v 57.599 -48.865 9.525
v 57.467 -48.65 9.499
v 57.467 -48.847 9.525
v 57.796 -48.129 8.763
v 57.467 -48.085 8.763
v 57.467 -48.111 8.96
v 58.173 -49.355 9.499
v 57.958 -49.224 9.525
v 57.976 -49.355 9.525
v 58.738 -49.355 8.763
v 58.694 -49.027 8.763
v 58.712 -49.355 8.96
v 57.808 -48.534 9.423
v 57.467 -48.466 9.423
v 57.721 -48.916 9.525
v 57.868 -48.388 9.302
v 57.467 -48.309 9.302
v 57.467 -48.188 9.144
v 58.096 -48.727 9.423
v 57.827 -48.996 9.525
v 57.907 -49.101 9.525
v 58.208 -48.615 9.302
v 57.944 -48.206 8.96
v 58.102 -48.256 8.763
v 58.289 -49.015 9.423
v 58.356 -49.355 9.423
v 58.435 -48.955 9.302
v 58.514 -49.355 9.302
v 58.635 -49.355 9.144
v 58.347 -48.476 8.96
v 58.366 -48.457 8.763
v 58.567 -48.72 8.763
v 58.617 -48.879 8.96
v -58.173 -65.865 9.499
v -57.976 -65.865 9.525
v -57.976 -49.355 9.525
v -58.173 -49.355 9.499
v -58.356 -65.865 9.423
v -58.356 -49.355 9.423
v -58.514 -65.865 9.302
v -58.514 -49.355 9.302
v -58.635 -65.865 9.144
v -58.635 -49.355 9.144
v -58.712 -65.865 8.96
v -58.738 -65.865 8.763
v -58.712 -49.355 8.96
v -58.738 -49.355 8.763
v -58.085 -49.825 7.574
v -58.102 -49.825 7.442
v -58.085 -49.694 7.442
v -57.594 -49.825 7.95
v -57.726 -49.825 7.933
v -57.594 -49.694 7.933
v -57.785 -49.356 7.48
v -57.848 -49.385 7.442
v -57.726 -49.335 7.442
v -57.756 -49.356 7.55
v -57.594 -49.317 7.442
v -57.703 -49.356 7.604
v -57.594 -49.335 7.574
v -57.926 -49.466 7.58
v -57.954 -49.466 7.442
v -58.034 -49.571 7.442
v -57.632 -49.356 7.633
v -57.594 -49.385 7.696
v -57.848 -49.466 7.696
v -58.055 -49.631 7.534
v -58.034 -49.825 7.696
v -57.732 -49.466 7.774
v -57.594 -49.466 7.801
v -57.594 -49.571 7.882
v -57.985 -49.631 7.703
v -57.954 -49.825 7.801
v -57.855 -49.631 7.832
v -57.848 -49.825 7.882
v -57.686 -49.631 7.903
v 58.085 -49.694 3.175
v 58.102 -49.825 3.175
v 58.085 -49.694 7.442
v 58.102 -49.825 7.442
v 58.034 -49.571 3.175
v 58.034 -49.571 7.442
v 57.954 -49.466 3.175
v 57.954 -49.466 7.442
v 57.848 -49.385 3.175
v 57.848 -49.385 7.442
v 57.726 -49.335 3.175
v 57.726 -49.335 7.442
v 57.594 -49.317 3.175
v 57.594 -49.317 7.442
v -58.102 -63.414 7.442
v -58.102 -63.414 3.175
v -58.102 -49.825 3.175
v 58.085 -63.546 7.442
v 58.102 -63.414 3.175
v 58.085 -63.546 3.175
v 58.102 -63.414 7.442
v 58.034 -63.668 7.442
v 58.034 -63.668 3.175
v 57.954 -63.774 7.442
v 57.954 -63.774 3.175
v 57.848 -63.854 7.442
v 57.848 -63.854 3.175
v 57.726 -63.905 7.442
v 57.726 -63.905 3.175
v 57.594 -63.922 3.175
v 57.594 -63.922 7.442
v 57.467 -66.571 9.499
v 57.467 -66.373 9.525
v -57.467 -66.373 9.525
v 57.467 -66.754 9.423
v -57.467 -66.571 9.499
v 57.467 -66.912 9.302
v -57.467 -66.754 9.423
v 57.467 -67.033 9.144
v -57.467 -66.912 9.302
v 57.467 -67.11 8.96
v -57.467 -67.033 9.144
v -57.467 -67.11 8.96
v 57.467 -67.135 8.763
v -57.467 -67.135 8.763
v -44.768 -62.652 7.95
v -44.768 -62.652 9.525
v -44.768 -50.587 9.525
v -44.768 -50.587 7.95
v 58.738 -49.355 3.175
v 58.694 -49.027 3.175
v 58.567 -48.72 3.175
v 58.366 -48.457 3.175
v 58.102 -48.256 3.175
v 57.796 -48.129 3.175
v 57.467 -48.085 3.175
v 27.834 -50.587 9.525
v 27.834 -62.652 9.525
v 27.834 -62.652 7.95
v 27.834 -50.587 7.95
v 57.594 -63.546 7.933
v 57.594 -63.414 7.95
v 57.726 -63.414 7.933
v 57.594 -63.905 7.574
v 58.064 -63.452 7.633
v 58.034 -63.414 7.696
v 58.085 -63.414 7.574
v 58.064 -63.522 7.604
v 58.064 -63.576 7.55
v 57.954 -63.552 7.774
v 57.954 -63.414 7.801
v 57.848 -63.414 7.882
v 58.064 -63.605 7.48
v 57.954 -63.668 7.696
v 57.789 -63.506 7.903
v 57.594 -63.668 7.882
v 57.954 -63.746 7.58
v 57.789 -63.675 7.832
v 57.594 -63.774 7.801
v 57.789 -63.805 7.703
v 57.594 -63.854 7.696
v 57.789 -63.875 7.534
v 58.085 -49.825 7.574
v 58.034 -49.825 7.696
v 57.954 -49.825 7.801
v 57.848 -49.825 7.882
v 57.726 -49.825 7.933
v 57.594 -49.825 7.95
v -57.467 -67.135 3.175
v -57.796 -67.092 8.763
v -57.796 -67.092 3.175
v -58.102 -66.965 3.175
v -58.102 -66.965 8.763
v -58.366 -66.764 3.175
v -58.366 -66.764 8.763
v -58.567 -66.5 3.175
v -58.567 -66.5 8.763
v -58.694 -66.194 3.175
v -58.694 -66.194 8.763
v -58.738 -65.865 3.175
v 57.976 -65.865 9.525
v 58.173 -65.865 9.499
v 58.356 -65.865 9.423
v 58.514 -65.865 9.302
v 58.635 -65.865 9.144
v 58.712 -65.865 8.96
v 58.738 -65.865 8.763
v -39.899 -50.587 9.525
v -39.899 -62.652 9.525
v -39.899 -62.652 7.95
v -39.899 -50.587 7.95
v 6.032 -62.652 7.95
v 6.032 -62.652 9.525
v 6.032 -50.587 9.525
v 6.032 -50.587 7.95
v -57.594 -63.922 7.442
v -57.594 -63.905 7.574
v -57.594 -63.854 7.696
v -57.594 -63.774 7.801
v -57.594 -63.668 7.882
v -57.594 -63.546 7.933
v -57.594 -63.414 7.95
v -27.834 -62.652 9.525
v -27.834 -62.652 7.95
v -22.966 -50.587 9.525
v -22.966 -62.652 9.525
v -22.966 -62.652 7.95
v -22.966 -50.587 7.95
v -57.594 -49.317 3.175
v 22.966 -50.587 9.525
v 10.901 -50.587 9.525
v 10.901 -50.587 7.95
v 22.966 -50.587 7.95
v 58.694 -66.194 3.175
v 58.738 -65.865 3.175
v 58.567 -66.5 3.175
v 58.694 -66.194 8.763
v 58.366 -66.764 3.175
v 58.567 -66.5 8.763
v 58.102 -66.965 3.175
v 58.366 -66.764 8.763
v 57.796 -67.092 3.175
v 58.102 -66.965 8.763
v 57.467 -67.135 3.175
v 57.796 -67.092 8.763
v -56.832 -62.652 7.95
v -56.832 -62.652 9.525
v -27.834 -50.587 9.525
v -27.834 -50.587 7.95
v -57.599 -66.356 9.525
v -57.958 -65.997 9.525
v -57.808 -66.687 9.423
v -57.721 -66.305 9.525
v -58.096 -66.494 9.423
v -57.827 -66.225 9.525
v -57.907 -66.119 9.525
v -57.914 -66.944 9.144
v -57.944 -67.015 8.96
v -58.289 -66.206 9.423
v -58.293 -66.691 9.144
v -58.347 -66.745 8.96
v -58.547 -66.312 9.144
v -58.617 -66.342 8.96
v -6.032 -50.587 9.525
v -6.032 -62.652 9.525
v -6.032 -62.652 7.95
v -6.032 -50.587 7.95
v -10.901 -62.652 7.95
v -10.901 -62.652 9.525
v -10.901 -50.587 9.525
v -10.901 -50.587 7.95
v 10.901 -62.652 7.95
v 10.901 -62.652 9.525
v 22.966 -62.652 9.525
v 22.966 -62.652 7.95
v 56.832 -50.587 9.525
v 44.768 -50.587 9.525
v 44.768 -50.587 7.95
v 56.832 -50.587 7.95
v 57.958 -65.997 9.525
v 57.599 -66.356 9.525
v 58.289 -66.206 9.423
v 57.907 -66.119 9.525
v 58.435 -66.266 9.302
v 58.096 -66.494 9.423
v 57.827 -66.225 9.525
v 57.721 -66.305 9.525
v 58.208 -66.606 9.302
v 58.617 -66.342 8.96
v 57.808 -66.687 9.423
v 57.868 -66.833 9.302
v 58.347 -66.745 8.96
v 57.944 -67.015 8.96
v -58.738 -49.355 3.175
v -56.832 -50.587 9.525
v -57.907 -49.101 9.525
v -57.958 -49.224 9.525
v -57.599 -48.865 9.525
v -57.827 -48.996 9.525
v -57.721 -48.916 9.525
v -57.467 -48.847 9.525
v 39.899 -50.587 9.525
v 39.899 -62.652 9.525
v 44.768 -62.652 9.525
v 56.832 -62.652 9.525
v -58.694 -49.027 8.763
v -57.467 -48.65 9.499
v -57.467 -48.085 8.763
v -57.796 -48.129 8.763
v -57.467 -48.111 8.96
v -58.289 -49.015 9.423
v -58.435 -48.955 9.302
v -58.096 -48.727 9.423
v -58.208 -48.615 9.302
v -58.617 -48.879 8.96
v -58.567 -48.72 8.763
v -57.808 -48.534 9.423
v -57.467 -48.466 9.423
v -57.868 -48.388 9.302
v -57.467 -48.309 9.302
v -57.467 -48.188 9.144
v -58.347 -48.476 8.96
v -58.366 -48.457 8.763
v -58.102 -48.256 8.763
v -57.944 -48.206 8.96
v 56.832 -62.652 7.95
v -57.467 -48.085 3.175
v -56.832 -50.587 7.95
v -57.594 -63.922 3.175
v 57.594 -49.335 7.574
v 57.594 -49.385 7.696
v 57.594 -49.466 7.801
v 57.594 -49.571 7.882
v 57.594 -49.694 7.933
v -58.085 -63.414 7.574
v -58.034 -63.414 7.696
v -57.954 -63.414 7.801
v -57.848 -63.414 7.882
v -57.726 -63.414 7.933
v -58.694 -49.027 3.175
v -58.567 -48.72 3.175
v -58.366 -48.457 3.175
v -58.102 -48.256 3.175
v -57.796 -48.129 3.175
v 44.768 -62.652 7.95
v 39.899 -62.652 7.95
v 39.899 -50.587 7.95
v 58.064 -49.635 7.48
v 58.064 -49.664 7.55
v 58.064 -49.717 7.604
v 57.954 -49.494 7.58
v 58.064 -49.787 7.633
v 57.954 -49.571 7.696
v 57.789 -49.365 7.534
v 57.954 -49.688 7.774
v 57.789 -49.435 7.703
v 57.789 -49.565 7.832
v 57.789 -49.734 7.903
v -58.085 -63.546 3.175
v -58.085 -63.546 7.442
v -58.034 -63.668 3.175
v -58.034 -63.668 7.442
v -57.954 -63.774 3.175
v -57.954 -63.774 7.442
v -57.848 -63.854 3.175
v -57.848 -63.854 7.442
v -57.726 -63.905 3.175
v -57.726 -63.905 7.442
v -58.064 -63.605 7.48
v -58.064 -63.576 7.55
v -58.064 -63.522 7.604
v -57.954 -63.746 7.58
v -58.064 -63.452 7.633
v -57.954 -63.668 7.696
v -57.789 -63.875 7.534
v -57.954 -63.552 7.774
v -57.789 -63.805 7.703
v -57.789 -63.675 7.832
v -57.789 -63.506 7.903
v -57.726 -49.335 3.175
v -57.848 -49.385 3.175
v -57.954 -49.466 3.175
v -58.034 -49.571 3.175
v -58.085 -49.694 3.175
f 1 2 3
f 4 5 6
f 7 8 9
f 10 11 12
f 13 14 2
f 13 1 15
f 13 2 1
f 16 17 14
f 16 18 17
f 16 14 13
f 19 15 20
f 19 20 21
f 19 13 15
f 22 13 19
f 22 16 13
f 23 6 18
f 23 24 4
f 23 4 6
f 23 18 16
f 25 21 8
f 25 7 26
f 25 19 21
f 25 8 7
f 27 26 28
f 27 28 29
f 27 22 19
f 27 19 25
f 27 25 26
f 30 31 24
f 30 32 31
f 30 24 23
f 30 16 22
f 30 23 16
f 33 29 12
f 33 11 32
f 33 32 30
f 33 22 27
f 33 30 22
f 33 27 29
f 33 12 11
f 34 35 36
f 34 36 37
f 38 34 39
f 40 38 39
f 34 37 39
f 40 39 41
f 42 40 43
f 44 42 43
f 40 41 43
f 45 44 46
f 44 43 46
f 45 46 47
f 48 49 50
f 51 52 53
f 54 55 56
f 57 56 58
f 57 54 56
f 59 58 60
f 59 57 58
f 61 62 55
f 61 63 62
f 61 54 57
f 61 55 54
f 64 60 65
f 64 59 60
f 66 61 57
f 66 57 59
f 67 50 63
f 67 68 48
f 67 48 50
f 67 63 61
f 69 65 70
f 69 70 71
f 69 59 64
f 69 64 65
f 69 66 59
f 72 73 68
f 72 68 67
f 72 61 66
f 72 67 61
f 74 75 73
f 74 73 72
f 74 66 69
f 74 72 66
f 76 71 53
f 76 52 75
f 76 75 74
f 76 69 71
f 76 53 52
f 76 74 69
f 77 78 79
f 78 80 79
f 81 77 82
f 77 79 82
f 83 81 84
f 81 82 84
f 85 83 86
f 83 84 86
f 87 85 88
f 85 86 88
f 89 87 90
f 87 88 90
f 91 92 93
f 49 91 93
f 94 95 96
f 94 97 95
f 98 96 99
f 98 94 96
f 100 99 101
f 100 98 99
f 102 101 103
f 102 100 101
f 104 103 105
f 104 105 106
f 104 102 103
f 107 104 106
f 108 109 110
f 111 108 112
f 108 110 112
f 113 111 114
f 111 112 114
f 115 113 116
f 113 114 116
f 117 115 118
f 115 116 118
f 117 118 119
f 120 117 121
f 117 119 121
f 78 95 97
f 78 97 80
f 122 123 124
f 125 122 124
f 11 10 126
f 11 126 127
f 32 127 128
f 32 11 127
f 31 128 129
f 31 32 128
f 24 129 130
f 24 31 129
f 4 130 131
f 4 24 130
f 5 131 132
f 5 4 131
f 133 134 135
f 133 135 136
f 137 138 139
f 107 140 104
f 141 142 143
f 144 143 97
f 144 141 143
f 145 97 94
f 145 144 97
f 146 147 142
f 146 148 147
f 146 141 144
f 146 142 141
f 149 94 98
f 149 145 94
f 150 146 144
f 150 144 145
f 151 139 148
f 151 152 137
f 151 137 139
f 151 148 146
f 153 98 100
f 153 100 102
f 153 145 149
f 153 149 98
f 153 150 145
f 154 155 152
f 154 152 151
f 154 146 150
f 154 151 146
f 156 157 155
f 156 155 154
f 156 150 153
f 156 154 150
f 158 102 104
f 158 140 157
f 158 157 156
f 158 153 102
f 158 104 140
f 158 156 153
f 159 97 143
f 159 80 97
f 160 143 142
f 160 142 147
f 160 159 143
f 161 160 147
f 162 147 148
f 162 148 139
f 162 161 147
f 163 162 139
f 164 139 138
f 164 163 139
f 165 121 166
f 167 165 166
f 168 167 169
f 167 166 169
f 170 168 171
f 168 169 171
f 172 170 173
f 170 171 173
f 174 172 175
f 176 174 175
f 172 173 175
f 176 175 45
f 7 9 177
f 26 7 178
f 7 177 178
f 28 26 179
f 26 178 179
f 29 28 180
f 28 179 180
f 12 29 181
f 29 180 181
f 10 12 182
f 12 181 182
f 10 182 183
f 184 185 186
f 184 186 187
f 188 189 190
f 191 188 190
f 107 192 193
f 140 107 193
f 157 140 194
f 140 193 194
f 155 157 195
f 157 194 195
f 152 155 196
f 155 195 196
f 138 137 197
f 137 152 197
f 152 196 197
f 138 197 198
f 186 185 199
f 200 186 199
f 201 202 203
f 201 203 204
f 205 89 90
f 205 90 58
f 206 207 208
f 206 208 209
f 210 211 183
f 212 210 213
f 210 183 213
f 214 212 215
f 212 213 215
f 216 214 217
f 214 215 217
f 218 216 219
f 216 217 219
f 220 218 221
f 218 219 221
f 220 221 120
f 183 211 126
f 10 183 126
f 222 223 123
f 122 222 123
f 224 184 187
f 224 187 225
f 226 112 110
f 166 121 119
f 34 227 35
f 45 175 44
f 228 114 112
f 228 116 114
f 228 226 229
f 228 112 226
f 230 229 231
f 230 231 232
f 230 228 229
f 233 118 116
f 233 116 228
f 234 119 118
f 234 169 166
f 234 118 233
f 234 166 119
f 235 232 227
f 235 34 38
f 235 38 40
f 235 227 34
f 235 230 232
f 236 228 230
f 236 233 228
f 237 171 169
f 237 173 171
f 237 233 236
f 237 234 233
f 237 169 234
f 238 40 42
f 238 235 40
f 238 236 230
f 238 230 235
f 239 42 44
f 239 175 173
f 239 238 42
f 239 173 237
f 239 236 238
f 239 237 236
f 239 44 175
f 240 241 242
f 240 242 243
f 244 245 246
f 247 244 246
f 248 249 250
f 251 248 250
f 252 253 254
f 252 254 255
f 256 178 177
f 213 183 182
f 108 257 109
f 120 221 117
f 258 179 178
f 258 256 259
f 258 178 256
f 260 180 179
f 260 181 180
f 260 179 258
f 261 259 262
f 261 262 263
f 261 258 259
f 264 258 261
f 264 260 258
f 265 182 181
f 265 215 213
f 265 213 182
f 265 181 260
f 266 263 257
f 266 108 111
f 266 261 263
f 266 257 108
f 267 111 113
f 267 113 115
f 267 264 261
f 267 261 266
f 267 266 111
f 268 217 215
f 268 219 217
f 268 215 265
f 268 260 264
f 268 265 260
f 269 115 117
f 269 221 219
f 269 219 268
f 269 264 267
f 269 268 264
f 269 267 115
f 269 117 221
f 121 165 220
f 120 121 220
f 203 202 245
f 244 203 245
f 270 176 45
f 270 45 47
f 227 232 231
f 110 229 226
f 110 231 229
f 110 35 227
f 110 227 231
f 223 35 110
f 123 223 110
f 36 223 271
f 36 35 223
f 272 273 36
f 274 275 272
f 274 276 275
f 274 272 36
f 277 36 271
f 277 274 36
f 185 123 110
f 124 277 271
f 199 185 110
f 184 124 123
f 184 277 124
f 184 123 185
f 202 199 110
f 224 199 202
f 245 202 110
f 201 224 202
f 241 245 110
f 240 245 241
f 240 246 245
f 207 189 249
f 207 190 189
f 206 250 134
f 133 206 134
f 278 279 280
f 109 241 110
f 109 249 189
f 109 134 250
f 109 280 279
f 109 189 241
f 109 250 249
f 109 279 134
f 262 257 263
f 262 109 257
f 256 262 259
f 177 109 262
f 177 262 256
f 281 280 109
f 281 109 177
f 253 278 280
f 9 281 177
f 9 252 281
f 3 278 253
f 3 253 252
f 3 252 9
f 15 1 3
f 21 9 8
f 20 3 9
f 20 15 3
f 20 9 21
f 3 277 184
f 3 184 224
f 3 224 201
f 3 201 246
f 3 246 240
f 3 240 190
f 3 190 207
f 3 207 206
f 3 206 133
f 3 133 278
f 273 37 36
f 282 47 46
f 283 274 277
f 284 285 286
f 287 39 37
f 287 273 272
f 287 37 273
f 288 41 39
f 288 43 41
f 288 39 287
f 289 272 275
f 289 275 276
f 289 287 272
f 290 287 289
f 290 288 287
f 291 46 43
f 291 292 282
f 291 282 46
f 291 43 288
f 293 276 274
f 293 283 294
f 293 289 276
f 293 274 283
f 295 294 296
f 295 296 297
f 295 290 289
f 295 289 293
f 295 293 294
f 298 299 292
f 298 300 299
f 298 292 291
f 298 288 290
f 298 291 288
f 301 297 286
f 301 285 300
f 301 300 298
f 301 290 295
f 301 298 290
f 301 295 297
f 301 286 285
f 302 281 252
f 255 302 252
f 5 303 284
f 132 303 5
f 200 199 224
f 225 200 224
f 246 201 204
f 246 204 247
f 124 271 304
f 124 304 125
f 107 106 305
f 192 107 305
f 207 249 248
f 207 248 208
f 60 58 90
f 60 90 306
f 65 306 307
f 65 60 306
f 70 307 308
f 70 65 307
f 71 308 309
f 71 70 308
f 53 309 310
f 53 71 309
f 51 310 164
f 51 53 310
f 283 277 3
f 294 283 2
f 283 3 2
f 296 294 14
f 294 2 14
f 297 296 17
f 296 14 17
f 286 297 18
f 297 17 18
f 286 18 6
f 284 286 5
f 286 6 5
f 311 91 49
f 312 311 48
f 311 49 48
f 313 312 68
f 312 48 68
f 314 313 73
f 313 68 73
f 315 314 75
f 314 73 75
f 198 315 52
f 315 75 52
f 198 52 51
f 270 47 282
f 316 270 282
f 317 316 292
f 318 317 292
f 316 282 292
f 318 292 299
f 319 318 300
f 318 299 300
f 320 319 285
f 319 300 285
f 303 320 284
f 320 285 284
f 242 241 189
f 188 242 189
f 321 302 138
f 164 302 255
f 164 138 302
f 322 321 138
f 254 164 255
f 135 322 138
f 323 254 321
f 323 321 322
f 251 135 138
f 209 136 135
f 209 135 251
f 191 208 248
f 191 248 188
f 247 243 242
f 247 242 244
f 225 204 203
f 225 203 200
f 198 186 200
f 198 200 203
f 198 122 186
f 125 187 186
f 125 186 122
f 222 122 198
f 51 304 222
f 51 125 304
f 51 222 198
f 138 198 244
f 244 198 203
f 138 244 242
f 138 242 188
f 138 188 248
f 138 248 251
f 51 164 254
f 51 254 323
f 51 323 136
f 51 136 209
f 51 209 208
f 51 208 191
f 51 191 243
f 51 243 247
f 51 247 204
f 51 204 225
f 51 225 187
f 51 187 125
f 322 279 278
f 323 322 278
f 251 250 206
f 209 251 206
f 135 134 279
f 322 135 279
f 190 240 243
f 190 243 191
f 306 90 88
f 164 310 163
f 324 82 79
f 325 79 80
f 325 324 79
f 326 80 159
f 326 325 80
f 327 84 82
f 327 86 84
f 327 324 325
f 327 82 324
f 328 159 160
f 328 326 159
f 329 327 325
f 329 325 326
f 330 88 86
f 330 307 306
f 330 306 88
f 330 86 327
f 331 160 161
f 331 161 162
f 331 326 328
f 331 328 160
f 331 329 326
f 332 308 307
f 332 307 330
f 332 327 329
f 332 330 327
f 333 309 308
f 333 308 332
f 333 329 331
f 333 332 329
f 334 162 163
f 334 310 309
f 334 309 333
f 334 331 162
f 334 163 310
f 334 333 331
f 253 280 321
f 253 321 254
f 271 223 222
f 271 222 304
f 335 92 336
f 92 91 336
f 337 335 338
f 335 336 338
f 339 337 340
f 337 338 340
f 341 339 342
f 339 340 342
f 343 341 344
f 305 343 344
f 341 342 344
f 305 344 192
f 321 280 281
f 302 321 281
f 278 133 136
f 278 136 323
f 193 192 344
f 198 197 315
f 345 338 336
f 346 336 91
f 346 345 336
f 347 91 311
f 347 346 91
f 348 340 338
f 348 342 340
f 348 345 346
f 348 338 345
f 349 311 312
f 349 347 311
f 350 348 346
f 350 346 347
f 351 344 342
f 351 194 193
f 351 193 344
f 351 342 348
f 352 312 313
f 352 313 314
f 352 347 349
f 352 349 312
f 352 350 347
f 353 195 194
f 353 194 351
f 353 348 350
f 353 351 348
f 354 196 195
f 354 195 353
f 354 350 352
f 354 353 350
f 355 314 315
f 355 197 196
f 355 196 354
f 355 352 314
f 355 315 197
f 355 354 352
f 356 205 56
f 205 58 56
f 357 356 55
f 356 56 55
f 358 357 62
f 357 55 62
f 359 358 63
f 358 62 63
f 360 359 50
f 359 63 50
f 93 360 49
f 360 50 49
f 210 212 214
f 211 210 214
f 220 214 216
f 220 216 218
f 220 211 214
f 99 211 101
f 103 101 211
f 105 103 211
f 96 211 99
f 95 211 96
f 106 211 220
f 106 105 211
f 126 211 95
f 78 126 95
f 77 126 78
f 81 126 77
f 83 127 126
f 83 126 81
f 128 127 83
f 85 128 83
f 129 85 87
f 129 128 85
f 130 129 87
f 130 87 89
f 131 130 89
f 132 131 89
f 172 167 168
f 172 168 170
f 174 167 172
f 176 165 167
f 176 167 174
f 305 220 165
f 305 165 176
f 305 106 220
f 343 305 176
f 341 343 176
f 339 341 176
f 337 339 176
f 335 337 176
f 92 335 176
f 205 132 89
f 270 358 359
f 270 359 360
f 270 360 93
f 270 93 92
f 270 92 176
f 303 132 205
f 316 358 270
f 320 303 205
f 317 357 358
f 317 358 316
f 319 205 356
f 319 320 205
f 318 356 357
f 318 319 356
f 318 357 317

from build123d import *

# Parameters (mm, degrees)
SKETCH1_W             = 117.475
SKETCH1_H             = 19.05
BOSS_EXTRUDE1_DEPTH   = 9.525
BOSS_EXTRUDE2_DEPTH   = 3.175
F_6_CLEARANCE_HOLE1_D = 4.3053
SKETCH5_W             = 12.065
SKETCH5_H             = 12.065
CUT_EXTRUDE1_DEPTH    = 10.525
SKETCH7_W             = 116.205
SKETCH7_H             = 14.605
CUT_EXTRUDE2_DEPTH    = 7.9502
SKETCH8_W             = 117.475
SKETCH8_H             = 28.575
CUT_EXTRUDE3_DEPTH    = 3.175
FILLET2_R             = 1.27
FILLET3_R             = 0.762
FILLET4_R             = 0.508


with BuildPart() as part:
    # Sketch1 → Boss-Extrude1 (new body)
    with BuildSketch(Plane.XY):
        with Locations((0, -57.6104797)):
            Rectangle(SKETCH1_W, SKETCH1_H)
    extrude(amount=BOSS_EXTRUDE1_DEPTH)

    # Sketch2 → Boss-Extrude2 (add)
    with BuildSketch(Plane.XY):
        with BuildLine():
            Line((35.56, -48.0854797), (58.7375, -48.0854797))
            Line((58.7375, -48.0854797), (44.939976119, -39.26086832))
            ThreePointArc((44.939976119, -39.26086832), (40.410479427, -39.106525106), (38.1, -43.0054797))
            Line((38.1, -43.0054797), (38.1, -45.5454797))
            ThreePointArc((38.1, -45.5454797), (37.356051224, -47.341530924), (35.56, -48.0854797))
        make_face()
        with BuildLine():
            Line((-38.1, -45.5454797), (-38.1, -43.0054797))
            ThreePointArc((-38.1, -43.0054797), (-40.410479427, -39.106525106), (-44.939976119, -39.26086832))
            Line((-44.939976119, -39.26086832), (-58.7375, -48.0854797))
            Line((-58.7375, -48.0854797), (-35.56, -48.0854797))
            ThreePointArc((-35.56, -48.0854797), (-37.356051224, -47.341530924), (-38.1, -45.5454797))
        make_face()
    extrude(amount=BOSS_EXTRUDE2_DEPTH)

    # #6 Clearance Hole1 (through all)
    with Locations(Plane.XY.offset(3.175)):
        with Locations((42.545, -43.0054797), (-42.545, -43.0054797)):
            Hole(F_6_CLEARANCE_HOLE1_D / 2)

    # Sketch5 → Cut-Extrude1 (cut, through all)
    with BuildSketch(Plane.XY.offset(9.525)):
        with Locations((50.8, -56.6198797)):
            Rectangle(SKETCH5_W, SKETCH5_H)
        with Locations((33.866666667, -56.6198797)):
            Rectangle(SKETCH5_W, SKETCH5_H)
        with Locations((16.933333333, -56.6198797)):
            Rectangle(SKETCH5_W, SKETCH5_H)
        with Locations((0, -56.6198797)):
            Rectangle(SKETCH5_W, SKETCH5_H)
        with Locations((-16.933333333, -56.6198797)):
            Rectangle(SKETCH5_W, SKETCH5_H)
        with Locations((-33.866666667, -56.6198797)):
            Rectangle(SKETCH5_W, SKETCH5_H)
        with Locations((-50.8, -56.6198797)):
            Rectangle(SKETCH5_W, SKETCH5_H)
    extrude(amount=-CUT_EXTRUDE1_DEPTH, mode=Mode.SUBTRACT)

    # Sketch7 → Cut-Extrude2 (cut)
    with BuildSketch(Plane(origin=(0, 0, 0), x_dir=(-1, 0, 0), z_dir=(0, 0, -1))):
        with Locations((0, -56.6198797)):
            Rectangle(SKETCH7_W, SKETCH7_H)
    extrude(amount=-CUT_EXTRUDE2_DEPTH, mode=Mode.SUBTRACT)

    # Sketch8 → Cut-Extrude3 (cut)
    with BuildSketch(Plane(origin=(0, 0, 0), x_dir=(-1, 0, 0), z_dir=(0, 0, -1))):
        with Locations((0, -52.8479797)):
            Rectangle(SKETCH8_W, SKETCH8_H)
    extrude(amount=-CUT_EXTRUDE3_DEPTH, mode=Mode.SUBTRACT)

    # Fillet2
    fillet2_edges = [part.edges().sort_by_distance(p)[0] for p in [
        (58.7375, -67.1354797, 6.35),
        (58.7375, -48.0854797, 6.35),
        (-58.7375, -48.0854797, 6.35),
        (-58.7375, -67.1354797, 6.35),
    ]]
    fillet(fillet2_edges, radius=FILLET2_R)

    # Fillet3
    fillet3_edges = [part.edges().sort_by_distance(p)[0] for p in [
        (-58.7375, -57.6104797, 9.525),
        (0, -48.0854797, 9.525),
        (0, -67.1354797, 9.525),
        (58.7375, -57.6104797, 9.525),
        (58.365525612, -66.763505312, 9.525),
        (58.365525612, -48.457454088, 9.525),
        (-58.365525612, -66.763505312, 9.525),
        (-58.365525612, -48.457454088, 9.525),
    ]]
    fillet(fillet3_edges, radius=FILLET3_R)

    # Fillet4
    fillet4_edges = [part.edges().sort_by_distance(p)[0] for p in [
        (0, -63.9223797, 7.9502),
        (-58.1025, -63.9223797, 5.5626),
        (-58.1025, -56.6198797, 7.9502),
        (-58.1025, -49.3173797, 5.5626),
        (0, -49.3173797, 7.9502),
        (58.1025, -49.3173797, 5.5626),
        (58.1025, -56.6198797, 7.9502),
        (58.1025, -63.9223797, 5.5626),
    ]]
    fillet(fillet4_edges, radius=FILLET4_R)


solid = part.part
